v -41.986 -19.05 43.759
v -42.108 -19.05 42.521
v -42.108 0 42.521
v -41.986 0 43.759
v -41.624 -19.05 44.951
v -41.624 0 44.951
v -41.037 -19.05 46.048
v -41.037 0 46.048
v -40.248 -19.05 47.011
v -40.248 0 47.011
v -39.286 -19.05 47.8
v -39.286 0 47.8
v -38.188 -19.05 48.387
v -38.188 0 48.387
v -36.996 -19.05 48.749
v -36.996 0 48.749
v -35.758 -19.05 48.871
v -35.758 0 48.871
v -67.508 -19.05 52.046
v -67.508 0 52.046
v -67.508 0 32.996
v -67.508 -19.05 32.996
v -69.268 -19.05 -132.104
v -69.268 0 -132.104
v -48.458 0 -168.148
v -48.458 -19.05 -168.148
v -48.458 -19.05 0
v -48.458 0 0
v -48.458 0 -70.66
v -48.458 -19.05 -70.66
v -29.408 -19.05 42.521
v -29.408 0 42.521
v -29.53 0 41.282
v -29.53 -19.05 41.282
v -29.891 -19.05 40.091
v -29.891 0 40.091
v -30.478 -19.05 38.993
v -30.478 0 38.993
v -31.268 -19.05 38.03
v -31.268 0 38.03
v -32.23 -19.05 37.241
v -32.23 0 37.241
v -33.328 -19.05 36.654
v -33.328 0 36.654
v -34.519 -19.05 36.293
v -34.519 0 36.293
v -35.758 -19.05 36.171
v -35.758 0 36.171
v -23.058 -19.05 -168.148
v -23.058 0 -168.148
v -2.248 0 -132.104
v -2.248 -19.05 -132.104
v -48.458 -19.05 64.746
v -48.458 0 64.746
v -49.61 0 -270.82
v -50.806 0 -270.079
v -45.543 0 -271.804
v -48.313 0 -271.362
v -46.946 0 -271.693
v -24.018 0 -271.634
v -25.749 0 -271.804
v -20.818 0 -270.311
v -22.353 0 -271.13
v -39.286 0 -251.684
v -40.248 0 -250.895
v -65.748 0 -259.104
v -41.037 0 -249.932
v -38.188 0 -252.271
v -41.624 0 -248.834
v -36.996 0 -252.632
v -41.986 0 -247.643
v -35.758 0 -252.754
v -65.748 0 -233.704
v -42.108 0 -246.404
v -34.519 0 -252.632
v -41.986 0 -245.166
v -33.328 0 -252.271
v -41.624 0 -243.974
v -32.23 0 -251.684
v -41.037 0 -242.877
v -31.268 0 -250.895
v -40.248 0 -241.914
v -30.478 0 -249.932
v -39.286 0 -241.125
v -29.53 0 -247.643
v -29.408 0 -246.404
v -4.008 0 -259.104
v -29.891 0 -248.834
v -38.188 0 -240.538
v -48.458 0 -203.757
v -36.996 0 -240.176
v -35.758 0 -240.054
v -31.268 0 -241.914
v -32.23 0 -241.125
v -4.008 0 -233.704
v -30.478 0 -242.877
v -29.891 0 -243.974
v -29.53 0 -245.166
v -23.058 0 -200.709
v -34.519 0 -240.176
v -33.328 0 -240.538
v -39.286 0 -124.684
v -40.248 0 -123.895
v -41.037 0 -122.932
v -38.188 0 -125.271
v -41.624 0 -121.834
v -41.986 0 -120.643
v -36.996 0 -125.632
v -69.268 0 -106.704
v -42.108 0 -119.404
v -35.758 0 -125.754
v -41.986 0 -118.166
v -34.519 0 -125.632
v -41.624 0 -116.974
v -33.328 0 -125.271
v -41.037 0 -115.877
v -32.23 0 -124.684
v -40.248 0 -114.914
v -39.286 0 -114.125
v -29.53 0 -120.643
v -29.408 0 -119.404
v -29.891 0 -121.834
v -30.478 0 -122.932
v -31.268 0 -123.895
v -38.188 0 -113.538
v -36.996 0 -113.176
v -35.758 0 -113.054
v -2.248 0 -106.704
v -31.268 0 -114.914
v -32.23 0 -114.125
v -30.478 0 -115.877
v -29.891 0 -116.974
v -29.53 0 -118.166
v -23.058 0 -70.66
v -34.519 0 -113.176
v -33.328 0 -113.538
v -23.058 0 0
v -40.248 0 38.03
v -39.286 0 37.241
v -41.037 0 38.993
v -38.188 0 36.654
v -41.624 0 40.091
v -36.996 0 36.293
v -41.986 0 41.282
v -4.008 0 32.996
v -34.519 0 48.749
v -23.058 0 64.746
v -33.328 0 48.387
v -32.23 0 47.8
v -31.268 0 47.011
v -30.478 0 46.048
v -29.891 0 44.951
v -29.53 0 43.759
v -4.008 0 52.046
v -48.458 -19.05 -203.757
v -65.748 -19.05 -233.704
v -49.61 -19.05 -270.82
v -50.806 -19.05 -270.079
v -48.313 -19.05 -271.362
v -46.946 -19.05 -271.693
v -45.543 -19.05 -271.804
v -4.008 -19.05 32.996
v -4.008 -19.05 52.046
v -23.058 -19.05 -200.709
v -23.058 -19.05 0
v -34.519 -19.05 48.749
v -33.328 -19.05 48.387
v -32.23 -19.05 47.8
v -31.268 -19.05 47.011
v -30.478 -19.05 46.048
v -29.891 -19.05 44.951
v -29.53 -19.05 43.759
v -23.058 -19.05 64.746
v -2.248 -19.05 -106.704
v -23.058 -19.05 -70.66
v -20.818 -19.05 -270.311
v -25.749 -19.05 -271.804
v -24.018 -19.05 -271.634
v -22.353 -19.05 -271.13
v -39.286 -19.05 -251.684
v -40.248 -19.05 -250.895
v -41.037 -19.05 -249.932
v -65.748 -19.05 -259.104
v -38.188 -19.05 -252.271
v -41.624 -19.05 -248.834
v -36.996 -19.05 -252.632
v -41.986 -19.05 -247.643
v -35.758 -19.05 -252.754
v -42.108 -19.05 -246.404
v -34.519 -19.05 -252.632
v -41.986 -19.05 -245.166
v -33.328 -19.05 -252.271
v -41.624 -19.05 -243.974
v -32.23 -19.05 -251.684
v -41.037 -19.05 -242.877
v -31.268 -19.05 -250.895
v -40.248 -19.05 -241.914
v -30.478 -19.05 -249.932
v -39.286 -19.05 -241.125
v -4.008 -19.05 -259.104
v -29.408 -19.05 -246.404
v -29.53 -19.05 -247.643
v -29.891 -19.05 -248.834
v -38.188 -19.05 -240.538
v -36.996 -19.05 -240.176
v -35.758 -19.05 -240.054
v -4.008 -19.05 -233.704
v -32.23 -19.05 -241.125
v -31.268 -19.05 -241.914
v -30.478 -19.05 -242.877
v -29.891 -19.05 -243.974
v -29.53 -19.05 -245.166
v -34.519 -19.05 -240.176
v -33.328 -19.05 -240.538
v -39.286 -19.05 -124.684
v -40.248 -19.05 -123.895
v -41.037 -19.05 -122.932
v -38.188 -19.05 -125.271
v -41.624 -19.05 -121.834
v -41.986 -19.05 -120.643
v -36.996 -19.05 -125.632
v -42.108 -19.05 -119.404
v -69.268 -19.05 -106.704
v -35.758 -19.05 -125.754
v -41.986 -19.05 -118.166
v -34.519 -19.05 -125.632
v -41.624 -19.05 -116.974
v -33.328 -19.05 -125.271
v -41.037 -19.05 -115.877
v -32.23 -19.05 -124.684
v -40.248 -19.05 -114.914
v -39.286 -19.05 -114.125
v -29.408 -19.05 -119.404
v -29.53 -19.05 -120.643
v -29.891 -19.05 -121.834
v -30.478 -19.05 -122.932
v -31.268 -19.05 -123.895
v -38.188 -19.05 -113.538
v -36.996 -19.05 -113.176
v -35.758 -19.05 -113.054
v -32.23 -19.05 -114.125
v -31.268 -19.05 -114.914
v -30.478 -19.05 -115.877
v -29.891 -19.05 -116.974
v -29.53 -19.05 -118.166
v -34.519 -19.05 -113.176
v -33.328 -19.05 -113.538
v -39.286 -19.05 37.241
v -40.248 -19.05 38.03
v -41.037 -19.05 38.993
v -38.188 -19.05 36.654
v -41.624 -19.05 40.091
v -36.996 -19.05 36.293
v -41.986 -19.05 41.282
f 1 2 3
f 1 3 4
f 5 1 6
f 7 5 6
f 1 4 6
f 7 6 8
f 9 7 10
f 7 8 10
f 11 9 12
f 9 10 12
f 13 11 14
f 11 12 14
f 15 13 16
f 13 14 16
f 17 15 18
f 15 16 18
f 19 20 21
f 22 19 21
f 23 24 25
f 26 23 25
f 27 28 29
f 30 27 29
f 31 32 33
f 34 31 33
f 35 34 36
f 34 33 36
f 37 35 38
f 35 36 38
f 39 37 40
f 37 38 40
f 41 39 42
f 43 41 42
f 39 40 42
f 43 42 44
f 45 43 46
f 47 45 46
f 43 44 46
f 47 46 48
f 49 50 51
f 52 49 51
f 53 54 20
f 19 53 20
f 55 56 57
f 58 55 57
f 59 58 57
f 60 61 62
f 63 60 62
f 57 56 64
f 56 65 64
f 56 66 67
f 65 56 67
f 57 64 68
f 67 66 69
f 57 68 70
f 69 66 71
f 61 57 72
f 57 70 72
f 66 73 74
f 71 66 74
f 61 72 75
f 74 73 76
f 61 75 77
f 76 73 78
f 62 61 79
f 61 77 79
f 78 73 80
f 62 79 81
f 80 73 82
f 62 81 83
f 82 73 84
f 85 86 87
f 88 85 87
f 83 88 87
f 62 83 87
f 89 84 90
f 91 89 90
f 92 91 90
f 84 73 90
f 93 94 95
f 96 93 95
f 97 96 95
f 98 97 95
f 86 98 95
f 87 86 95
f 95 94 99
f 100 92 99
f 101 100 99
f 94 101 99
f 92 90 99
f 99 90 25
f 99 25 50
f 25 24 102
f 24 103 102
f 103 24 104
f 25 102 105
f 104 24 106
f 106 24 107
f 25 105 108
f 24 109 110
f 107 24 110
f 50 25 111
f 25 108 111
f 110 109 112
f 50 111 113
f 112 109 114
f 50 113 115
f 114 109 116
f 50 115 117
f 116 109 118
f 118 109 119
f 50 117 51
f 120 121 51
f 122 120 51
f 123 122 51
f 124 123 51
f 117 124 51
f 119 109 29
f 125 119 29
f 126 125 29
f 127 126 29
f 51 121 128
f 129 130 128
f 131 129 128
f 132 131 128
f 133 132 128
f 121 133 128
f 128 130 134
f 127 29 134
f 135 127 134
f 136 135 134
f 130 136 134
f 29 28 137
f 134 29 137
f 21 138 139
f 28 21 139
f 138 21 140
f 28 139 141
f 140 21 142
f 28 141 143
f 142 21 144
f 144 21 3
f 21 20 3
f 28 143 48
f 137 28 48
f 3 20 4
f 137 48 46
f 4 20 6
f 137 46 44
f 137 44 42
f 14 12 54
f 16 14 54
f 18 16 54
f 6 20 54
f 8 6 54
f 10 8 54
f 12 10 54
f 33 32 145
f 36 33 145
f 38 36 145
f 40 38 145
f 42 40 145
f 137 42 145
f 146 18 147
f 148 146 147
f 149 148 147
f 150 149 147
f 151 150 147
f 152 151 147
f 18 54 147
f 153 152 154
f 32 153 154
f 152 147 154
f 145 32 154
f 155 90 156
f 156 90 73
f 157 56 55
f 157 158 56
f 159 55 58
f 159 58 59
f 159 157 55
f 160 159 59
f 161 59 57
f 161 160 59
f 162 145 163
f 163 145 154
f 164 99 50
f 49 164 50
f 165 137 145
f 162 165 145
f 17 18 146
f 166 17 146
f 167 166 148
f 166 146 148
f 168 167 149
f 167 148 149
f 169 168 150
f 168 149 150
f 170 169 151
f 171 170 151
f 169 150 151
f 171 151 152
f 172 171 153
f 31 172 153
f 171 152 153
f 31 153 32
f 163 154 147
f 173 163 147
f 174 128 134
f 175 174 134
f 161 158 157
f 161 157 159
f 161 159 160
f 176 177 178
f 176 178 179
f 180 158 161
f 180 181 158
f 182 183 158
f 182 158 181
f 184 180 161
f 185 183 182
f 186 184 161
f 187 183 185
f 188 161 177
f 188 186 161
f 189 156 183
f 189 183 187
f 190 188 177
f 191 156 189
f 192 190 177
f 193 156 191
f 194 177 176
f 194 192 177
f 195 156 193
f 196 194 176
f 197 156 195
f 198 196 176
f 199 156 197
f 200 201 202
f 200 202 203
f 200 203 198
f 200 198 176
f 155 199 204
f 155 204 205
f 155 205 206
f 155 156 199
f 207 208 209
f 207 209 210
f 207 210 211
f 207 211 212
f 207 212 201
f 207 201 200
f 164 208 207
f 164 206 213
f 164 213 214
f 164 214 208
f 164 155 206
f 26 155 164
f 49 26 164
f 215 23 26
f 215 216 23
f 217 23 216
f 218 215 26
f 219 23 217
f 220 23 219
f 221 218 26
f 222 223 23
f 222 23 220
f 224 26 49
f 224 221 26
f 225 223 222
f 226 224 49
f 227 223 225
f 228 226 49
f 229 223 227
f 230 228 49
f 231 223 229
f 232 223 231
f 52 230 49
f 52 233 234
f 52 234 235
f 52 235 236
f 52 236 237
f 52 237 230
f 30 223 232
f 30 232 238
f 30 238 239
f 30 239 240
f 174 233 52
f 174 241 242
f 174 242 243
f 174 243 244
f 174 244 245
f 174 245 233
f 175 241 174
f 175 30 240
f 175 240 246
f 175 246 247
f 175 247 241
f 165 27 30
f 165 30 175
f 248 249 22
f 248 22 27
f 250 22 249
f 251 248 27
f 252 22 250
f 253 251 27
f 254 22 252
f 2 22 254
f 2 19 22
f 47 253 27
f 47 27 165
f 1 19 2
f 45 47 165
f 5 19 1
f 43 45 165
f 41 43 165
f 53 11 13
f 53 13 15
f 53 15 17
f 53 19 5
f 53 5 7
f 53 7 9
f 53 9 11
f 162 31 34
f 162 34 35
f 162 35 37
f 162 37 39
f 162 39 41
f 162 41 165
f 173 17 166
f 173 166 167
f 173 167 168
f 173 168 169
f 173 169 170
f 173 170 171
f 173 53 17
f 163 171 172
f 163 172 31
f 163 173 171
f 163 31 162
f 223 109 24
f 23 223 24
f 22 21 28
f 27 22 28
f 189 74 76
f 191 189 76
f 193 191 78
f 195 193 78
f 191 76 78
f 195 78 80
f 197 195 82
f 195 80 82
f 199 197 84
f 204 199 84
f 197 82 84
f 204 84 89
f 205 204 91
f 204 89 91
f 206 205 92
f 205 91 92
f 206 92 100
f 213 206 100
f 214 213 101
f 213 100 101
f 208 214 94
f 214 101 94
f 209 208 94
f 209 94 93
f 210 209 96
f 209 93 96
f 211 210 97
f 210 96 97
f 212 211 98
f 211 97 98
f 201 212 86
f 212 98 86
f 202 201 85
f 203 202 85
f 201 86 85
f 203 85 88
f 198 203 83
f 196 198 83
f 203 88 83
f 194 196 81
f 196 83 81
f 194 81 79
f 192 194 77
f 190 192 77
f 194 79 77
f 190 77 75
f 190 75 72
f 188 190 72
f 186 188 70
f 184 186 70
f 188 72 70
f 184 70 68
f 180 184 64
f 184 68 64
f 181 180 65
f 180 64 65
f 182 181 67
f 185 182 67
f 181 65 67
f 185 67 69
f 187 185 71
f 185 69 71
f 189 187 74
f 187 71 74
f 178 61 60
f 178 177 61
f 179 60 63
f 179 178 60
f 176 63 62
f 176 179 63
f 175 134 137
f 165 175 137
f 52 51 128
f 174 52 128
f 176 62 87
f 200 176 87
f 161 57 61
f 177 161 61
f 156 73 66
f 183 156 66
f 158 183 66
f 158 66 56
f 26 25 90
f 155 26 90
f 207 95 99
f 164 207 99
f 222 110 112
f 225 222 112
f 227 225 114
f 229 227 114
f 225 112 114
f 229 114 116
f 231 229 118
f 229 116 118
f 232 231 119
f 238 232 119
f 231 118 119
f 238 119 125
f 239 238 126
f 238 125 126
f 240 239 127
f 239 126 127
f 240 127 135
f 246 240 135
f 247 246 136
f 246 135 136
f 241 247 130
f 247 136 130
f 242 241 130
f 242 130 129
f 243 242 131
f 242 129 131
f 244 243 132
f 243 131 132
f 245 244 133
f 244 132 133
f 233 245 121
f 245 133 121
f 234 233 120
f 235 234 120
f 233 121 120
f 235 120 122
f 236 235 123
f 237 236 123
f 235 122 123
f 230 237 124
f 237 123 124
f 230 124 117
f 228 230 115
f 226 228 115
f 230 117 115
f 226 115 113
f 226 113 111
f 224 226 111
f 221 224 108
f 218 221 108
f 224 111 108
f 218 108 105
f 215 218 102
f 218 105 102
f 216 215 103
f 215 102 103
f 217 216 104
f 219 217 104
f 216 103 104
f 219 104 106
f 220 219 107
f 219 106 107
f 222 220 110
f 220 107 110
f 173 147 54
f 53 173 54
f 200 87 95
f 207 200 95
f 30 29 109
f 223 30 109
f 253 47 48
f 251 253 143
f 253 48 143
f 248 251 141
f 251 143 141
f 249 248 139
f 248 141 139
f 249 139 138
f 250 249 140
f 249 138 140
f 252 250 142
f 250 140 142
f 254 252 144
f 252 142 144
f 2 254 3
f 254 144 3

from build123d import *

# Parameters (mm, degrees)
F0_W     = 17.2899770278
F0_H     = 12.7
F0_W_2   = 19.05
F0_W_3   = 20.8100229722
F0_H_2   = 9.525
F1_DEPTH = 19.05
F2_R     = 8.89


# Not quite as in the source:
# - a feature names something its author has since deleted; it is built from what else it names


with BuildPart() as f1:
    # F0 (on Front) → F1 (new body)
    with BuildSketch(Plane.XZ):
        with BuildLine():
            Line((-48.4576454937, -259.1044321158), (-48.4576454937, -271.8044321158))
            Line((-48.4576454937, -271.8044321158), (-23.0576454937, -271.8044321158))
            Line((-23.0576454937, -271.8044321158), (-23.0576454937, -259.1044321158))
            Line((-23.0576454937, -259.1044321158), (-23.0576454937, -246.4044321158))
            Line((-23.0576454937, -246.4044321158), (-29.4076454937, -246.4044321158))
            ThreePointArc((-29.4076454937, -246.4044321158), (-35.7576454937, -252.7544321158), (-42.1076454937, -246.4044321158))
            Line((-42.1076454937, -246.4044321158), (-48.4576454937, -246.4044321158))
            Line((-48.4576454937, -246.4044321158), (-48.4576454937, -259.1044321158))
        make_face()
        Polygon((-65.7476225216, -259.1044321158), (-48.4576454937, -271.8044321158), (-48.4576454937, -259.1044321158), align=None)
        Polygon((-23.0576454937, -259.1044321158), (-23.0576454937, -271.8044321158), (-4.0076454937, -259.1044321158), align=None)
        with Locations((-57.1026340077, -252.7544321158)):
            Rectangle(F0_W, F0_H)
        with Locations((-13.5326454937, -252.7544321158)):
            Rectangle(F0_W_2, F0_H)
        with Locations((-57.1026340077, -240.0544321158)):
            Rectangle(F0_W, F0_H)
        with BuildLine():
            Line((-48.4576454937, -233.7044321158), (-48.4576454937, -246.4044321158))
            Line((-48.4576454937, -246.4044321158), (-42.1076454937, -246.4044321158))
            ThreePointArc((-42.1076454937, -246.4044321158), (-35.7576454937, -240.0544321158), (-29.4076454937, -246.4044321158))
            Line((-29.4076454937, -246.4044321158), (-23.0576454937, -246.4044321158))
            Line((-23.0576454937, -246.4044321158), (-23.0576454937, -233.7044321158))
            Line((-23.0576454937, -233.7044321158), (-23.0576454937, -200.7088642316))
            Line((-23.0576454937, -200.7088642316), (-23.0576454937, -168.1484492103))
            Line((-23.0576454937, -168.1484492103), (-23.0576454937, -132.1044321158))
            Line((-23.0576454937, -132.1044321158), (-23.0576454937, -119.4044321158))
            Line((-23.0576454937, -119.4044321158), (-29.4076454937, -119.4044321158))
            ThreePointArc((-29.4076454937, -119.4044321158), (-35.7576454937, -125.7544321158), (-42.1076454937, -119.4044321158))
            Line((-42.1076454937, -119.4044321158), (-48.4576454937, -119.4044321158))
            Line((-48.4576454937, -119.4044321158), (-48.4576454937, -132.1044321158))
            Line((-48.4576454937, -132.1044321158), (-48.4576454937, -168.1484492103))
            Line((-48.4576454937, -168.1484492103), (-48.4576454937, -203.7573134419))
            Line((-48.4576454937, -203.7573134419), (-48.4576454937, -233.7044321158))
        make_face()
        with Locations((-13.5326454937, -240.0544321158)):
            Rectangle(F0_W_2, F0_H)
        Polygon((-65.7476225216, -233.7044321158), (-48.4576454937, -233.7044321158), (-48.4576454937, -203.7573134419), align=None)
        Polygon((-23.0576454937, -200.7088642316), (-23.0576454937, -233.7044321158), (-4.0076454937, -233.7044321158), align=None)
        Polygon((-69.2676684659, -132.1044321158), (-48.4576454937, -168.1484492103), (-48.4576454937, -132.1044321158), align=None)
        Polygon((-23.0576454937, -132.1044321158), (-23.0576454937, -168.1484492103), (-2.2476225216, -132.1044321158), align=None)
        with Locations((-58.8626569798, -125.7544321158)):
            Rectangle(F0_W_3, F0_H)
        with Locations((-12.6526340077, -125.7544321158)):
            Rectangle(F0_W_3, F0_H)
        with Locations((-58.8626569798, -113.0544321158)):
            Rectangle(F0_W_3, F0_H)
        with BuildLine():
            Line((-48.4576454937, -106.7044321158), (-48.4576454937, -119.4044321158))
            Line((-48.4576454937, -119.4044321158), (-42.1076454937, -119.4044321158))
            ThreePointArc((-42.1076454937, -119.4044321158), (-35.7576454937, -113.0544321158), (-29.4076454937, -119.4044321158))
            Line((-29.4076454937, -119.4044321158), (-23.0576454937, -119.4044321158))
            Line((-23.0576454937, -119.4044321158), (-23.0576454937, -106.7044321158))
            Line((-23.0576454937, -106.7044321158), (-23.0576454937, -70.6604150213))
            Line((-23.0576454937, -70.6604150213), (-23.0576454937, 0))
            Line((-23.0576454937, 0), (-23.0576454937, 32.9955678842))
            Line((-23.0576454937, 32.9955678842), (-35.7576454937, 32.9955678842))
            Line((-35.7576454937, 32.9955678842), (-48.4576454937, 32.9955678842))
            Line((-48.4576454937, 32.9955678842), (-48.4576454937, 0))
            Line((-48.4576454937, 0), (-48.4576454937, -70.6604150213))
            Line((-48.4576454937, -70.6604150213), (-48.4576454937, -106.7044321158))
        make_face()
        with Locations((-12.6526340077, -113.0544321158)):
            Rectangle(F0_W_3, F0_H)
        Polygon((-69.2676684659, -106.7044321158), (-48.4576454937, -106.7044321158), (-48.4576454937, -70.6604150213), align=None)
        Polygon((-23.0576454937, -70.6604150213), (-23.0576454937, -106.7044321158), (-2.2476225216, -106.7044321158), align=None)
        Polygon((-67.5076454937, 32.9955678842), (-48.4576454937, 0), (-48.4576454937, 32.9955678842), align=None)
        Polygon((-23.0576454937, 32.9955678842), (-23.0576454937, 0), (-4.0076454937, 32.9955678842), align=None)
        with Locations((-57.9826454937, 37.7580678842)):
            Rectangle(F0_W_2, F0_H_2)
        with Locations((-13.5326454937, 37.7580678842)):
            Rectangle(F0_W_2, F0_H_2)
        with Locations((-57.9826454937, 47.2830678842)):
            Rectangle(F0_W_2, F0_H_2)
        with Locations((-13.5326454937, 47.2830678842)):
            Rectangle(F0_W_2, F0_H_2)
        Polygon((-48.4576454937, 64.7455678842), (-48.4576454937, 52.0455678842), (-35.7576454937, 52.0455678842), (-23.0576454937, 52.0455678842), (-23.0576454937, 64.7455678842), align=None)
        Polygon((-67.5076454937, 52.0455678842), (-48.4576454937, 52.0455678842), (-48.4576454937, 64.7455678842), align=None)
        Polygon((-23.0576454937, 64.7455678842), (-23.0576454937, 52.0455678842), (-4.0076454937, 52.0455678842), align=None)
        with BuildLine():
            Line((-29.4076454937, 42.5205678842), (-23.0576454937, 42.5205678842))
            Line((-23.0576454937, 42.5205678842), (-23.0576454937, 52.0455678842))
            Line((-23.0576454937, 52.0455678842), (-35.7576454937, 52.0455678842))
            Line((-35.7576454937, 52.0455678842), (-35.7576454937, 48.8705678842))
            ThreePointArc((-35.7576454937, 48.8705678842), (-31.2675174332, 47.0106959447), (-29.4076454937, 42.5205678842))
        make_face()
        with BuildLine():
            Line((-48.4576454937, 52.0455678842), (-48.4576454937, 42.5205678842))
            Line((-48.4576454937, 42.5205678842), (-42.1076454937, 42.5205678842))
            ThreePointArc((-42.1076454937, 42.5205678842), (-40.2477735543, 47.0106959447), (-35.7576454937, 48.8705678842))
            Line((-35.7576454937, 48.8705678842), (-35.7576454937, 52.0455678842))
            Line((-35.7576454937, 52.0455678842), (-48.4576454937, 52.0455678842))
        make_face()
        with BuildLine():
            Line((-35.7576454937, 32.9955678842), (-23.0576454937, 32.9955678842))
            Line((-23.0576454937, 32.9955678842), (-23.0576454937, 42.5205678842))
            Line((-23.0576454937, 42.5205678842), (-29.4076454937, 42.5205678842))
            ThreePointArc((-29.4076454937, 42.5205678842), (-31.2675174332, 38.0304398237), (-35.7576454937, 36.1705678842))
            Line((-35.7576454937, 36.1705678842), (-35.7576454937, 32.9955678842))
        make_face()
        with BuildLine():
            Line((-48.4576454937, 42.5205678842), (-48.4576454937, 32.9955678842))
            Line((-48.4576454937, 32.9955678842), (-35.7576454937, 32.9955678842))
            Line((-35.7576454937, 32.9955678842), (-35.7576454937, 36.1705678842))
            ThreePointArc((-35.7576454937, 36.1705678842), (-40.2477735543, 38.0304398237), (-42.1076454937, 42.5205678842))
            Line((-42.1076454937, 42.5205678842), (-48.4576454937, 42.5205678842))
        make_face()
    extrude(amount=F1_DEPTH)

    # F2
    f2_edges = [f1.edges().sort_by_distance(p)[0] for p in [
        (-23.057645, -9.525, -271.804432),
        (-48.457645, -9.525, -271.804432),
    ]]
    fillet(f2_edges, radius=F2_R)


solid = f1.part
